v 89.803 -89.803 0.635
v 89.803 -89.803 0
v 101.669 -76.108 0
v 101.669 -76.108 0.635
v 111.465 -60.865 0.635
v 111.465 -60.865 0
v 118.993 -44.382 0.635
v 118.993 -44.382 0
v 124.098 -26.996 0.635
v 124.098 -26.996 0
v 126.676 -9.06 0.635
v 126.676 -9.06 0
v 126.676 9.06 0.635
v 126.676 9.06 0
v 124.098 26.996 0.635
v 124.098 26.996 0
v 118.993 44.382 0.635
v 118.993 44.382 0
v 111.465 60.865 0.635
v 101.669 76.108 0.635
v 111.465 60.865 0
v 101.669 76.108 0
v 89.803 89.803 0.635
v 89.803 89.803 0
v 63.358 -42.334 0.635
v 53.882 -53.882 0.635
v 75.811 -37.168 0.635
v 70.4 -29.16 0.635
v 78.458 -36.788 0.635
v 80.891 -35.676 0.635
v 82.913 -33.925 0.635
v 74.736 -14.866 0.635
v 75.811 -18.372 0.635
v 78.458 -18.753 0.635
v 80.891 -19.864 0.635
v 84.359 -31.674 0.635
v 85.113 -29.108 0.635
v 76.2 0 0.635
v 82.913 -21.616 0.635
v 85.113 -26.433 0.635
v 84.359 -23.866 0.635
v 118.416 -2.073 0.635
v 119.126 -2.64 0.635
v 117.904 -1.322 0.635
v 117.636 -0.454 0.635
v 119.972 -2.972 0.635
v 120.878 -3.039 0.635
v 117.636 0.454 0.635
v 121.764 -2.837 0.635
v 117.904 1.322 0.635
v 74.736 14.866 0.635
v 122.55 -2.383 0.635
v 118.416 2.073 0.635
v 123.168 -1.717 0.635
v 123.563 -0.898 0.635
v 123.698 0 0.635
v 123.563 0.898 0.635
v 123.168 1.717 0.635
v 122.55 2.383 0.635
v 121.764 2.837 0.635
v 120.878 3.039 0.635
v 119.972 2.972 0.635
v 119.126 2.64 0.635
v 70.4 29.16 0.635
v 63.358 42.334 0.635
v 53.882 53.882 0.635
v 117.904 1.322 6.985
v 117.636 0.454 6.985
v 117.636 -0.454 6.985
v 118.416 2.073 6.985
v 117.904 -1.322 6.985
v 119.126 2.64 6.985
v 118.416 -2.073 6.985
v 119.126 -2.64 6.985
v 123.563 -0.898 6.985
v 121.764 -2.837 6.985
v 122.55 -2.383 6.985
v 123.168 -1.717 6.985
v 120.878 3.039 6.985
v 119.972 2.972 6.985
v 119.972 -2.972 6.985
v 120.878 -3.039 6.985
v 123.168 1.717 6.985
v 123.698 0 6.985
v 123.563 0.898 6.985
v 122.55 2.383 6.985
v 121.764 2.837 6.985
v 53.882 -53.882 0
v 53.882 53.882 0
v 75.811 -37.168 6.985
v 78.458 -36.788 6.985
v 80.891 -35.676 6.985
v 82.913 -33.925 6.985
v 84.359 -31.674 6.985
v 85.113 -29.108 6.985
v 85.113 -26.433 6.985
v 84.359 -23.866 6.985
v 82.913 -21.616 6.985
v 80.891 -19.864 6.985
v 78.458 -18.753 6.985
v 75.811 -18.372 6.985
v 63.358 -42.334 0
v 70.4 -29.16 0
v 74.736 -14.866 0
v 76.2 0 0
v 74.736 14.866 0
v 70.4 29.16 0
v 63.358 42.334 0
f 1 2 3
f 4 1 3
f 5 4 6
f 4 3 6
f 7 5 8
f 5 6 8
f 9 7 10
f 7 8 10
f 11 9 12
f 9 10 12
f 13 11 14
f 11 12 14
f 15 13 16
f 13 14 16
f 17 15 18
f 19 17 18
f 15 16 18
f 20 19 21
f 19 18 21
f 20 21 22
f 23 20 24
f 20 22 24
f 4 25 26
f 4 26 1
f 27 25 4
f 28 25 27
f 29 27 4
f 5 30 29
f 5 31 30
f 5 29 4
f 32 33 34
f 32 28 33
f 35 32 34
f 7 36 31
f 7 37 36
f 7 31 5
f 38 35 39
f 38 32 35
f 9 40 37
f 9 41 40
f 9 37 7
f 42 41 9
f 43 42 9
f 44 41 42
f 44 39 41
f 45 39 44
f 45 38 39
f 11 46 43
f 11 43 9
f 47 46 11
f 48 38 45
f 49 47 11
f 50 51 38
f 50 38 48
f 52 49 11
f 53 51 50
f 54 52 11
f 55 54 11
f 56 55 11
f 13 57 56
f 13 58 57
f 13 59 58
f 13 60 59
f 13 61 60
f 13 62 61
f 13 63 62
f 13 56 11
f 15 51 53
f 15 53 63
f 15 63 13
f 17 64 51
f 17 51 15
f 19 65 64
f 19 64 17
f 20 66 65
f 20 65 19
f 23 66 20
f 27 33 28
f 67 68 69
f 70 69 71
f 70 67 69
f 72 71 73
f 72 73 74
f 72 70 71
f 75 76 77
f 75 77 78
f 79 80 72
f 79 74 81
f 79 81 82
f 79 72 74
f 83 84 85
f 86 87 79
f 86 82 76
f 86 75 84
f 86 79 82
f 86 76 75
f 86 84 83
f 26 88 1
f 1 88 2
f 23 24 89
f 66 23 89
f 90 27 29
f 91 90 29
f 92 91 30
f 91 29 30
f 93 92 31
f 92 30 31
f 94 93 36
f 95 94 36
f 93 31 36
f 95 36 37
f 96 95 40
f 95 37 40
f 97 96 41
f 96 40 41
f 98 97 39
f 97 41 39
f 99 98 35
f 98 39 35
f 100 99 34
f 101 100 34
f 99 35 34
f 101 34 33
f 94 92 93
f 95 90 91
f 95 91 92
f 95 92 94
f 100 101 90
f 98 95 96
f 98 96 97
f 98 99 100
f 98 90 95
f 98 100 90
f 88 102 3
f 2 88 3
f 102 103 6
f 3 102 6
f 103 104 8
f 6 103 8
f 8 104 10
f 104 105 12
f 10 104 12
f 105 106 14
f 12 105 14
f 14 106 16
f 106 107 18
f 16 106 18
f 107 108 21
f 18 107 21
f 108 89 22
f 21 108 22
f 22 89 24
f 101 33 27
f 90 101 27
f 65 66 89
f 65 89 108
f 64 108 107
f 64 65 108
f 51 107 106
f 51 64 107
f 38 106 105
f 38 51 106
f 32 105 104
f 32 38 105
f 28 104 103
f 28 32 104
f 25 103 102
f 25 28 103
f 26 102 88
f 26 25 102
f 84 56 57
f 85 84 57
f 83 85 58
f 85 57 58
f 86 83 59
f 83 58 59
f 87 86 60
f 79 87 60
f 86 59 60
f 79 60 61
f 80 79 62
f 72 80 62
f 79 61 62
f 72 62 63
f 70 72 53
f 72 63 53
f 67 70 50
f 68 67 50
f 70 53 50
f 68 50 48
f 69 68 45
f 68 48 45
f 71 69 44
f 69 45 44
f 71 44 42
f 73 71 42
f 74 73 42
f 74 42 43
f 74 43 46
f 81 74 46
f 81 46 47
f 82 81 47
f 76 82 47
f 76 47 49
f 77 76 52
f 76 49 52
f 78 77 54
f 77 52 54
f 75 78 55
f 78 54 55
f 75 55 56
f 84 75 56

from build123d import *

# Parameters (mm, degrees)
F1_DEPTH = 0.635
F4_DEPTH = 25.4
F2_R     = 3.048
F6_DEPTH = 6.35
F7_DEPTH = 6.35


with BuildPart() as f1:
    # F0 (on Top) → F1 (new body)
    with BuildSketch(Plane.XY):
        with BuildLine():
            Line((0, 0), (89.802561, -89.802561))
            ThreePointArc((89.802561, -89.802561), (127, 0), (89.802561, 89.802561))
            Line((89.802561, 89.802561), (0, 0))
        make_face()
    extrude(amount=F1_DEPTH)

    # F3 (on face) → F4 (intersect)
    with BuildSketch(Plane.XY.offset(0.635)):
        with BuildLine():
            ThreePointArc((53.881537, 53.881537), (76.2, 0), (53.881537, -53.881537))
            Line((53.881537, -53.881537), (89.802561, -89.802561))
            ThreePointArc((89.802561, -89.802561), (127, 0), (89.802561, 89.802561))
            Line((89.802561, 89.802561), (53.881537, 53.881537))
        make_face()
    extrude(amount=-F4_DEPTH, mode=Mode.INTERSECT)

    # F2 (on face) → F6 (join)
    with BuildSketch(Plane.XY.offset(0.635)):
        with Locations((120.65, 0)):
            Circle(F2_R)
    extrude(amount=F6_DEPTH)

    # F5 (on face) → F7 (join)
    with BuildSketch(Plane.XY.offset(0.635)):
        with BuildLine():
            Line((75.810533, -18.372254), (75.810533, -37.168254))
            ThreePointArc((75.810533, -37.168254), (85.208533, -27.770254), (75.810533, -18.372254))
        make_face()
    extrude(amount=F7_DEPTH)


solid = f1.part
